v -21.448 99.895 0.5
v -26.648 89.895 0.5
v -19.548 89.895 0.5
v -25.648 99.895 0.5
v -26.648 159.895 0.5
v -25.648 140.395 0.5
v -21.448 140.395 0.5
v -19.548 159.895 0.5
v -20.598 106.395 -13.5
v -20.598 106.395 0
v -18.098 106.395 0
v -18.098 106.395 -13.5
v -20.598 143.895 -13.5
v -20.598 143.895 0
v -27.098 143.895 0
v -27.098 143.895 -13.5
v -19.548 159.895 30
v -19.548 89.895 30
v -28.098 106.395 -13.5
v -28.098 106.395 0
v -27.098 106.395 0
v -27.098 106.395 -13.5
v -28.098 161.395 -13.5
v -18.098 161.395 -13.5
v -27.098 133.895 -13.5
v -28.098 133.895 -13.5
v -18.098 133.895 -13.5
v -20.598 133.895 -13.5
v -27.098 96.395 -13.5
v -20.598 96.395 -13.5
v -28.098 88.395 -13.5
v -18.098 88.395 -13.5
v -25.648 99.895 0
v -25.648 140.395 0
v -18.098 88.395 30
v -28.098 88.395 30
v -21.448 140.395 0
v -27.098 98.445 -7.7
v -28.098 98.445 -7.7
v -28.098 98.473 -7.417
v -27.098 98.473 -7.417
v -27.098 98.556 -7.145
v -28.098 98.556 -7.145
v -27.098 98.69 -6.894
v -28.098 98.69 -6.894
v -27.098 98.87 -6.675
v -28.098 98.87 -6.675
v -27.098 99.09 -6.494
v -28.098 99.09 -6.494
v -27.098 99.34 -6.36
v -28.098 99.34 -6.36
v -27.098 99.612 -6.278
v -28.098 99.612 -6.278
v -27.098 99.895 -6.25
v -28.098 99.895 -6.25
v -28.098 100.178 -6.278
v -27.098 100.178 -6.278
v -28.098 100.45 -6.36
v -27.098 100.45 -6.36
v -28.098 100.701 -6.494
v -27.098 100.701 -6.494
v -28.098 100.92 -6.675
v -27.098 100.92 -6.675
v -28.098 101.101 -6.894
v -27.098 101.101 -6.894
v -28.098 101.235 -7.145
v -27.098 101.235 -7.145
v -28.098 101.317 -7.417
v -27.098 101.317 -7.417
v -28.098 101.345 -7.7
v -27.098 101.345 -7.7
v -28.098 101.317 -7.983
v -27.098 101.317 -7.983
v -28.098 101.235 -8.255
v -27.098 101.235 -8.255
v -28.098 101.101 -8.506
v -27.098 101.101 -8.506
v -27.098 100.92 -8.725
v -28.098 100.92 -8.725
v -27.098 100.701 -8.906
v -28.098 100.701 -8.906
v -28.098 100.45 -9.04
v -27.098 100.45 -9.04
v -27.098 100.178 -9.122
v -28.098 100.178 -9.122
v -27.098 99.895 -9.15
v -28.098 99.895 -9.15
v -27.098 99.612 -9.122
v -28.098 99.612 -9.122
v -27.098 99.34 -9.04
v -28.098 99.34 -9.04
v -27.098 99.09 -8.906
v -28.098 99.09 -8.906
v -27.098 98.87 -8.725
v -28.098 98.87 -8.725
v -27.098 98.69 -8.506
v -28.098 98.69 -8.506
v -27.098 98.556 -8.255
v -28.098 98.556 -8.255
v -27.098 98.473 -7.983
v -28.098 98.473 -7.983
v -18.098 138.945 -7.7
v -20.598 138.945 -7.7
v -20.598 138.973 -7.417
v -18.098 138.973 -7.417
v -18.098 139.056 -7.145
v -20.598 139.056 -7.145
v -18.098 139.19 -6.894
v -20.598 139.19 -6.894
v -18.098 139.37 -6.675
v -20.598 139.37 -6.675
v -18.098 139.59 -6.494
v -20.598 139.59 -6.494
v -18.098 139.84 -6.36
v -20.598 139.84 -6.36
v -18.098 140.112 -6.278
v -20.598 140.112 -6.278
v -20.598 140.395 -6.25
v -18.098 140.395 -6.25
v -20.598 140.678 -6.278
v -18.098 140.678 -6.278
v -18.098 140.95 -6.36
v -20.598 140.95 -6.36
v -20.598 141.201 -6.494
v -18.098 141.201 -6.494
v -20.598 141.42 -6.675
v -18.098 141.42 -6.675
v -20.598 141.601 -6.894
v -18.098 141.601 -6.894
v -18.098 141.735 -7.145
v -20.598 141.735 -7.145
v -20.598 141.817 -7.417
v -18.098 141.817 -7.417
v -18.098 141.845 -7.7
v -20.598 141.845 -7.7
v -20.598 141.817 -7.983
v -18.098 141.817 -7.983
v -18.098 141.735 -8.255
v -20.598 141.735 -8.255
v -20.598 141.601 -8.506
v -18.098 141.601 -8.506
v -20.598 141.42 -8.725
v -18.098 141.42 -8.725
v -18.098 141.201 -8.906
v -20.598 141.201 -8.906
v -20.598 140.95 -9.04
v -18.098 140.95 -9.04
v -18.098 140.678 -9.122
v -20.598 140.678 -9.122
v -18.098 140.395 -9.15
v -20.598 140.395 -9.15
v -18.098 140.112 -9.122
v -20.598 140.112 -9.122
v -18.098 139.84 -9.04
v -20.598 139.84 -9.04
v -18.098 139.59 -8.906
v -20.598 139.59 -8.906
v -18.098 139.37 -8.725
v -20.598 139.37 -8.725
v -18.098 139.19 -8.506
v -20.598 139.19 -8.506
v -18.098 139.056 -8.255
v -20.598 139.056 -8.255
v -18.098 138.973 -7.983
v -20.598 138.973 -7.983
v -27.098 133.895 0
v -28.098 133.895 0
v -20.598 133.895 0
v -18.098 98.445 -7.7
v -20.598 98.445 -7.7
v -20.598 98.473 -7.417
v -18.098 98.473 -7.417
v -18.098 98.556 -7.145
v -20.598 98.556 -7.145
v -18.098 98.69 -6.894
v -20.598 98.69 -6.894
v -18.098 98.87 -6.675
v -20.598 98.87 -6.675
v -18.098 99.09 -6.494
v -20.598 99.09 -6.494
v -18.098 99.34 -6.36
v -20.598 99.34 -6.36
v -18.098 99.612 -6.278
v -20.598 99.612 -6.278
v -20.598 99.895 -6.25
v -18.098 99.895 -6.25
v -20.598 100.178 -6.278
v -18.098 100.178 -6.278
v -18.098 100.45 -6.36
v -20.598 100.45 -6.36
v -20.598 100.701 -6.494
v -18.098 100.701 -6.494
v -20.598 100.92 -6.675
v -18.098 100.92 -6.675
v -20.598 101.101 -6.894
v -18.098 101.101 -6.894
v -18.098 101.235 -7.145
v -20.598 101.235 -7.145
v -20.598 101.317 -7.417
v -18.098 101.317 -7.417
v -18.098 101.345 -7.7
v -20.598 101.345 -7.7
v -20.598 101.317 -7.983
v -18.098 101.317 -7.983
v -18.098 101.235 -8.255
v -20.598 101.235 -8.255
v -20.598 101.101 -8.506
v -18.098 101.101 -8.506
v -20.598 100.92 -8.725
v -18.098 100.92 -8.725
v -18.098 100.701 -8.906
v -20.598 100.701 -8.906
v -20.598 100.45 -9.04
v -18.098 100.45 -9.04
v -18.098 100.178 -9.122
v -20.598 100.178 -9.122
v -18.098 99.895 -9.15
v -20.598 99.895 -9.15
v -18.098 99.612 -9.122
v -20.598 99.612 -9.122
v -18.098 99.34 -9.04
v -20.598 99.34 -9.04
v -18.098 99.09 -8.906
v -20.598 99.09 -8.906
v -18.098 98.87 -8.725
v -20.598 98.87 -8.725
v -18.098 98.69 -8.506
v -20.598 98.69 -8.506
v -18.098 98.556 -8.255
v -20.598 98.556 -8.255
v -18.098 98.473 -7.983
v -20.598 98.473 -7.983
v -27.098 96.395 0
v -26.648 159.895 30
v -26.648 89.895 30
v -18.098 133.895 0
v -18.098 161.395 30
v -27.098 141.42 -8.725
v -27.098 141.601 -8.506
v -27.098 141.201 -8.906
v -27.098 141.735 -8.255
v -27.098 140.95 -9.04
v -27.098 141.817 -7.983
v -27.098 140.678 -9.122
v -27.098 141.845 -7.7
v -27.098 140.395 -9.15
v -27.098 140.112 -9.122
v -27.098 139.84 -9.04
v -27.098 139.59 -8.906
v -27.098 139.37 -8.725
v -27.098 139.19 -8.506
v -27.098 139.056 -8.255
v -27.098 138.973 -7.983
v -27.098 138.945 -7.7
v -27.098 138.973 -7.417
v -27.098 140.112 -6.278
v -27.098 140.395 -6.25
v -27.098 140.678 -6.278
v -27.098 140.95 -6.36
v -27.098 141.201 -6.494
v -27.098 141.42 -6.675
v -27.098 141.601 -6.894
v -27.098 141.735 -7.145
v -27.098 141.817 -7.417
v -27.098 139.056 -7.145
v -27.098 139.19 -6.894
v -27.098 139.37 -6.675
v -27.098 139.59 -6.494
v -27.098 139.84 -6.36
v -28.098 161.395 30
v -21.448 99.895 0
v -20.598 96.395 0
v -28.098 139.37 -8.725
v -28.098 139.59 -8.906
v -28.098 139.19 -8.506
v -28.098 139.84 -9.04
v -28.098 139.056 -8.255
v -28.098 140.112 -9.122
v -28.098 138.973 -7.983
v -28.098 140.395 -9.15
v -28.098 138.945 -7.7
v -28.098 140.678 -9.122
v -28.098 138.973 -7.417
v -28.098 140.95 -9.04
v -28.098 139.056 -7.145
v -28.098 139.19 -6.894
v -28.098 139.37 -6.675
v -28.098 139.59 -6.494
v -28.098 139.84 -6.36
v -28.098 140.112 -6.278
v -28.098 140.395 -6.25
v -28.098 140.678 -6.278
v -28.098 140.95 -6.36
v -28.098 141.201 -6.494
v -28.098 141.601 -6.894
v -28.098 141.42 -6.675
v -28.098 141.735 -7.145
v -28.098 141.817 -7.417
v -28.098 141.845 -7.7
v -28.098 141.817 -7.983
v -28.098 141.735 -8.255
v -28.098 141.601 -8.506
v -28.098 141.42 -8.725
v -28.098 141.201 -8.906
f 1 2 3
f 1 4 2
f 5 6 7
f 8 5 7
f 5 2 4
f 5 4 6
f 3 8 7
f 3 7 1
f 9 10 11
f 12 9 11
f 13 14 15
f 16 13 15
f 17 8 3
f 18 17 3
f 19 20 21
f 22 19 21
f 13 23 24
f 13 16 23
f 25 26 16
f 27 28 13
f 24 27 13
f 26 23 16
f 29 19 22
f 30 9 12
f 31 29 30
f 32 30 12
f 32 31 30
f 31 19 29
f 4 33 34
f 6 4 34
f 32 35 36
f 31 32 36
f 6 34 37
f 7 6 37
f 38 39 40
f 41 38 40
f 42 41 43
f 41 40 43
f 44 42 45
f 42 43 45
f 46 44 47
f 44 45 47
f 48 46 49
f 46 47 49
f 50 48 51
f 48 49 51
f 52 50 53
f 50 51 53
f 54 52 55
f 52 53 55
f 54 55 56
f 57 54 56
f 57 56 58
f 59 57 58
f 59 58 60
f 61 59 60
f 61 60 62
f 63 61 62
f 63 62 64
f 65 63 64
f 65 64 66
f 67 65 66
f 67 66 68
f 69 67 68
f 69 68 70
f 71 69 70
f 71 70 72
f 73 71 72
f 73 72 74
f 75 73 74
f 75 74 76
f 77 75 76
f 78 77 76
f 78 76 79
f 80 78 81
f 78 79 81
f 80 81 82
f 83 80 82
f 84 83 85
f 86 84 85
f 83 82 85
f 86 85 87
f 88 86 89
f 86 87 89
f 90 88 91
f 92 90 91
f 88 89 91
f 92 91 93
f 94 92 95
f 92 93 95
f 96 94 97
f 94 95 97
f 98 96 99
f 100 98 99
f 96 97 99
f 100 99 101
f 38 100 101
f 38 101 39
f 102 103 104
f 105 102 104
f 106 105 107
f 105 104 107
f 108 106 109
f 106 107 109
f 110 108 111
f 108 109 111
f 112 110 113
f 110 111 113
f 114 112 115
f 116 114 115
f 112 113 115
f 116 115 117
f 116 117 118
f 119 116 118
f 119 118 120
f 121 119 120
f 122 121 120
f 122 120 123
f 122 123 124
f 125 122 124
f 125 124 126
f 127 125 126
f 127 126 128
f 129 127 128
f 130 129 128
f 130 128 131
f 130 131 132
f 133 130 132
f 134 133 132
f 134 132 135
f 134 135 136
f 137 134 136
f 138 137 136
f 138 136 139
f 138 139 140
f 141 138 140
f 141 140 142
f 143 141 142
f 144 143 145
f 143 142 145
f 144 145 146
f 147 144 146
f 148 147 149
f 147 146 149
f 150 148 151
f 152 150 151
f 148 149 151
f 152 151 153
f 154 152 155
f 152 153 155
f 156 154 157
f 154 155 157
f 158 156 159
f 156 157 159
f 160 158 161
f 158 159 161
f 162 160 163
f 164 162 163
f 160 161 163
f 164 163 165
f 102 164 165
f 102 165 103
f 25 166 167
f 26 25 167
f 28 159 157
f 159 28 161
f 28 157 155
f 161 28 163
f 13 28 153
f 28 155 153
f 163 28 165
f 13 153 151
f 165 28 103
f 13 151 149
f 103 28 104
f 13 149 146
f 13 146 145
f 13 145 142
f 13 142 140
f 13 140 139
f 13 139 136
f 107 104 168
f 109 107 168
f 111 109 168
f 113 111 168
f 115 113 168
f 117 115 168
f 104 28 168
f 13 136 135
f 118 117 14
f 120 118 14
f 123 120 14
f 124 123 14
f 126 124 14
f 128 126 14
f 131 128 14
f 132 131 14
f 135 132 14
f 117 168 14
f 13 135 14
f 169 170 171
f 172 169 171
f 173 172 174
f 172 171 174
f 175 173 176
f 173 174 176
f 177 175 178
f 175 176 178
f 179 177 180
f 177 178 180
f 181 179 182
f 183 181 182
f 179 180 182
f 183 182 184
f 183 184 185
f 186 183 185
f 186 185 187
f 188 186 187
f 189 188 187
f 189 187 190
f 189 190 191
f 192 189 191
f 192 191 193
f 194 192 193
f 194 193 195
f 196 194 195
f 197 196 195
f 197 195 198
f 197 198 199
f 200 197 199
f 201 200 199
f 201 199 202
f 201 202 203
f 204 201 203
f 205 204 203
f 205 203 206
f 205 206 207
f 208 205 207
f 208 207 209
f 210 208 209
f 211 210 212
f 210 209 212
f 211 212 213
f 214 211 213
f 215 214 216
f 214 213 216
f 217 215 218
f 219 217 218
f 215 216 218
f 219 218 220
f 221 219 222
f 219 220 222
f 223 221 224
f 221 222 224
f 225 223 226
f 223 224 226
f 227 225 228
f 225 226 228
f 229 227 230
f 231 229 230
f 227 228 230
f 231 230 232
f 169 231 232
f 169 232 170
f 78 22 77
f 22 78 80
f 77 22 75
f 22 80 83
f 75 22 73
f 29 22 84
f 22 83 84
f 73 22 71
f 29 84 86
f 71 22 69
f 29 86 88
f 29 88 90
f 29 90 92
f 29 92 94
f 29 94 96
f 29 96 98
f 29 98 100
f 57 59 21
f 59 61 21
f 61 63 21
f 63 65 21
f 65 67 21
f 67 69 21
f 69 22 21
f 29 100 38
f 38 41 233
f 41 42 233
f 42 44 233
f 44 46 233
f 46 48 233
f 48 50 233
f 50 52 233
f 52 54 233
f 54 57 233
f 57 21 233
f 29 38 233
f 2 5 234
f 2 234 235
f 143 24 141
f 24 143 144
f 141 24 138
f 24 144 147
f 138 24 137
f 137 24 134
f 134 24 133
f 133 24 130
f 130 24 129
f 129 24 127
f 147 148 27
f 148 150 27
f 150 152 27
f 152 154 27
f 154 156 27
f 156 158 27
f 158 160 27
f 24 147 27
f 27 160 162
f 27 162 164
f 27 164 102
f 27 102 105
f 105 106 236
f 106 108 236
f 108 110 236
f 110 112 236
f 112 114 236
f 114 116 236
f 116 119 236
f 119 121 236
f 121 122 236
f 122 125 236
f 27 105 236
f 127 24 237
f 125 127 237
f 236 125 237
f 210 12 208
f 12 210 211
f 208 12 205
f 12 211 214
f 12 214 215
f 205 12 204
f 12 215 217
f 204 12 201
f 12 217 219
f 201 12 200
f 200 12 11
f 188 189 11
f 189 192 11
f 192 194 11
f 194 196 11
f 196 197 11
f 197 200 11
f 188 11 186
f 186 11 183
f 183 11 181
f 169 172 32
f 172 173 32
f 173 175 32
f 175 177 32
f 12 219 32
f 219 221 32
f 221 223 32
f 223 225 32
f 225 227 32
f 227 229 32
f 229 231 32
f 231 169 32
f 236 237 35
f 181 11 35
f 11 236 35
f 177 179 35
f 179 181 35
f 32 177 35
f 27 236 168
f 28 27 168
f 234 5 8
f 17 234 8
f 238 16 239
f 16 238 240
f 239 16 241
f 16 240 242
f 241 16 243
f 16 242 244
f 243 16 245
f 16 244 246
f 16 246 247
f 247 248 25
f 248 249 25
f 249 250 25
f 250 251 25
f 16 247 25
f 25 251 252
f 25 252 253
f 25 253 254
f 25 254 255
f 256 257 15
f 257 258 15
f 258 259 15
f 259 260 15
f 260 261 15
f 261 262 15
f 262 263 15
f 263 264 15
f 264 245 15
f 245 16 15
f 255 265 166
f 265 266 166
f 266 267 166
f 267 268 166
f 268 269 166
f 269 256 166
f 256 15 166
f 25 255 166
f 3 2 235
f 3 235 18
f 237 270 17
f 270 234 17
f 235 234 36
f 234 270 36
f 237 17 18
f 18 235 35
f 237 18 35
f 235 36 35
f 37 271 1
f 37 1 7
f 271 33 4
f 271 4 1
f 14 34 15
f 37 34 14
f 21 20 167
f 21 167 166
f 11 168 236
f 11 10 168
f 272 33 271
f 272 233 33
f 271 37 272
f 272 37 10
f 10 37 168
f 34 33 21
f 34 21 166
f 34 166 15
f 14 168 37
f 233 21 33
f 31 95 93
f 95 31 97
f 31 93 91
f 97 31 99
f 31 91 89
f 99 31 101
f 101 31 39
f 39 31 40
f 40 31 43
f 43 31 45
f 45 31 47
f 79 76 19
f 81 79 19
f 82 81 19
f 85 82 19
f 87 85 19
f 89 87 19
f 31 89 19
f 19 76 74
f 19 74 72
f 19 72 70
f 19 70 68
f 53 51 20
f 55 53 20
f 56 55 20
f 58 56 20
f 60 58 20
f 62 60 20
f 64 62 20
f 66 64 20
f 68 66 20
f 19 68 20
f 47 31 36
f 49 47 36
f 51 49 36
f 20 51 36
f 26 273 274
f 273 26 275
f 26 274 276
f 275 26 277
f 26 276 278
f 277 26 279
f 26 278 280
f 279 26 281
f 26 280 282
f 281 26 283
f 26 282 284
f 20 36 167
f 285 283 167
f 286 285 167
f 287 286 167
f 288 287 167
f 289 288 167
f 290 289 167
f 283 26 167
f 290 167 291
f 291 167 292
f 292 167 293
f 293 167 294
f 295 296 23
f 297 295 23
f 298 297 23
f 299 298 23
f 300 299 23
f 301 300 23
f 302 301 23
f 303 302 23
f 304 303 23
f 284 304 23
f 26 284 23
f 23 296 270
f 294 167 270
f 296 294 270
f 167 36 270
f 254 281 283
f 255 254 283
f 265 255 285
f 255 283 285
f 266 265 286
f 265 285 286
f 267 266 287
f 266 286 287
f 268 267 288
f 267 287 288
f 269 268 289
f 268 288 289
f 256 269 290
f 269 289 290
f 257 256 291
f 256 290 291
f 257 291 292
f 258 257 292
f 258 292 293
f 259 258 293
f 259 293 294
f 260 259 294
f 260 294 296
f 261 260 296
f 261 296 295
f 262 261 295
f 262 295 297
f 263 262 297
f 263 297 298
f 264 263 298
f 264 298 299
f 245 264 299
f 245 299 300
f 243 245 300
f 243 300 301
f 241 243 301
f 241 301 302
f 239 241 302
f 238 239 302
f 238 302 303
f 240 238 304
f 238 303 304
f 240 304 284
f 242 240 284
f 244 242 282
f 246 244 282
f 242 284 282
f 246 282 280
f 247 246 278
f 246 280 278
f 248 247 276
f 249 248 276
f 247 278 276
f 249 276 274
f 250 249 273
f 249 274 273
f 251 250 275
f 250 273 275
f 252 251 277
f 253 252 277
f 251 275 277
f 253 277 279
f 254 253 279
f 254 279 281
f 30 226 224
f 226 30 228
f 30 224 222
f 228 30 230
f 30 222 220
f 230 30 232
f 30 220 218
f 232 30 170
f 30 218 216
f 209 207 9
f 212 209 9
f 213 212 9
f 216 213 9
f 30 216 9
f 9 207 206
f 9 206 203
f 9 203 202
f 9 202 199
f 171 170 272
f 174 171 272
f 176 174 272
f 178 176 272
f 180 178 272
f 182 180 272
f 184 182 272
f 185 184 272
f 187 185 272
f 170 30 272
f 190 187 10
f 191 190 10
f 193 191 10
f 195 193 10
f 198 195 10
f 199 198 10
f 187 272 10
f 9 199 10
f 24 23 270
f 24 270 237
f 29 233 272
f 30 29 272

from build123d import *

# Parameters (mm, degrees)
SKETCH_W      = 7.1
SKETCH_H      = 70
SKETCH_W_2    = 4.2
SKETCH_H_2    = 40.5
PAD_DEPTH     = 0.5
SKETCH001_W   = 10
SKETCH001_H   = 73
SKETCH001_W_2 = 7.1
SKETCH001_H_2 = 70
PAD001_DEPTH  = 30
PAD002_DEPTH  = 13.5
SKETCH003_R   = 1.45
HOLE_DEPTH    = 10.001


with BuildPart() as part:
    # Sketch → Pad (new body)
    with BuildSketch(Plane.XY):
        with Locations((-23.097803, 124.895146)):
            Rectangle(SKETCH_W, SKETCH_H)
        with Locations((-23.547803, 120.145146)):
            Rectangle(SKETCH_W_2, SKETCH_H_2, mode=Mode.SUBTRACT)
    extrude(amount=PAD_DEPTH)

    # Sketch001 (on Face9 of Pad) → Pad001 (join)
    with BuildSketch(Plane(origin=(0, 0, 0), x_dir=(1, 0, 0), z_dir=(0, 0, -1))):
        with Locations((-23.097803, -124.895146)):
            Rectangle(SKETCH001_W, SKETCH001_H)
        with Locations((-23.097803, -124.895146)):
            Rectangle(SKETCH001_W_2, SKETCH001_H_2, mode=Mode.SUBTRACT)
    extrude(amount=-PAD001_DEPTH)

    # Sketch002 (on Face15 of Pad001) → Pad002 (join)
    with BuildSketch(Plane(origin=(0, 0, 0), x_dir=(1, 0, 0), z_dir=(0, 0, -1))):
        Polygon((-28.097803, -88.395146), (-28.097803, -96.395146), (-28.097803, -106.395146), (-27.097803, -106.395146), (-27.097803, -96.395146), (-20.597803, -96.395146), (-20.597803, -106.395146), (-18.097803, -106.395146), (-18.097803, -88.395146), align=None)
        Polygon((-28.097803, -161.395146), (-18.097803, -161.395146), (-18.097803, -133.895146), (-20.597803, -133.895146), (-20.597803, -143.895146), (-27.097803, -143.895146), (-27.097803, -133.895146), (-28.097803, -133.895146), (-28.097803, -143.895146), align=None)
    extrude(amount=PAD002_DEPTH)

    # Sketch003 (on Face24 of Pad002) → Hole (cut, through all)
    with BuildSketch(Plane(origin=(-28.097803, 0, 0), x_dir=(0, -1, 0), z_dir=(-1, 0, 0))):
        with Locations((-140.395146, -7.7)):
            Circle(SKETCH003_R)
        with Locations((-99.895146, -7.7)):
            Circle(SKETCH003_R)
    extrude(amount=-HOLE_DEPTH, mode=Mode.SUBTRACT)


solid = part.part
